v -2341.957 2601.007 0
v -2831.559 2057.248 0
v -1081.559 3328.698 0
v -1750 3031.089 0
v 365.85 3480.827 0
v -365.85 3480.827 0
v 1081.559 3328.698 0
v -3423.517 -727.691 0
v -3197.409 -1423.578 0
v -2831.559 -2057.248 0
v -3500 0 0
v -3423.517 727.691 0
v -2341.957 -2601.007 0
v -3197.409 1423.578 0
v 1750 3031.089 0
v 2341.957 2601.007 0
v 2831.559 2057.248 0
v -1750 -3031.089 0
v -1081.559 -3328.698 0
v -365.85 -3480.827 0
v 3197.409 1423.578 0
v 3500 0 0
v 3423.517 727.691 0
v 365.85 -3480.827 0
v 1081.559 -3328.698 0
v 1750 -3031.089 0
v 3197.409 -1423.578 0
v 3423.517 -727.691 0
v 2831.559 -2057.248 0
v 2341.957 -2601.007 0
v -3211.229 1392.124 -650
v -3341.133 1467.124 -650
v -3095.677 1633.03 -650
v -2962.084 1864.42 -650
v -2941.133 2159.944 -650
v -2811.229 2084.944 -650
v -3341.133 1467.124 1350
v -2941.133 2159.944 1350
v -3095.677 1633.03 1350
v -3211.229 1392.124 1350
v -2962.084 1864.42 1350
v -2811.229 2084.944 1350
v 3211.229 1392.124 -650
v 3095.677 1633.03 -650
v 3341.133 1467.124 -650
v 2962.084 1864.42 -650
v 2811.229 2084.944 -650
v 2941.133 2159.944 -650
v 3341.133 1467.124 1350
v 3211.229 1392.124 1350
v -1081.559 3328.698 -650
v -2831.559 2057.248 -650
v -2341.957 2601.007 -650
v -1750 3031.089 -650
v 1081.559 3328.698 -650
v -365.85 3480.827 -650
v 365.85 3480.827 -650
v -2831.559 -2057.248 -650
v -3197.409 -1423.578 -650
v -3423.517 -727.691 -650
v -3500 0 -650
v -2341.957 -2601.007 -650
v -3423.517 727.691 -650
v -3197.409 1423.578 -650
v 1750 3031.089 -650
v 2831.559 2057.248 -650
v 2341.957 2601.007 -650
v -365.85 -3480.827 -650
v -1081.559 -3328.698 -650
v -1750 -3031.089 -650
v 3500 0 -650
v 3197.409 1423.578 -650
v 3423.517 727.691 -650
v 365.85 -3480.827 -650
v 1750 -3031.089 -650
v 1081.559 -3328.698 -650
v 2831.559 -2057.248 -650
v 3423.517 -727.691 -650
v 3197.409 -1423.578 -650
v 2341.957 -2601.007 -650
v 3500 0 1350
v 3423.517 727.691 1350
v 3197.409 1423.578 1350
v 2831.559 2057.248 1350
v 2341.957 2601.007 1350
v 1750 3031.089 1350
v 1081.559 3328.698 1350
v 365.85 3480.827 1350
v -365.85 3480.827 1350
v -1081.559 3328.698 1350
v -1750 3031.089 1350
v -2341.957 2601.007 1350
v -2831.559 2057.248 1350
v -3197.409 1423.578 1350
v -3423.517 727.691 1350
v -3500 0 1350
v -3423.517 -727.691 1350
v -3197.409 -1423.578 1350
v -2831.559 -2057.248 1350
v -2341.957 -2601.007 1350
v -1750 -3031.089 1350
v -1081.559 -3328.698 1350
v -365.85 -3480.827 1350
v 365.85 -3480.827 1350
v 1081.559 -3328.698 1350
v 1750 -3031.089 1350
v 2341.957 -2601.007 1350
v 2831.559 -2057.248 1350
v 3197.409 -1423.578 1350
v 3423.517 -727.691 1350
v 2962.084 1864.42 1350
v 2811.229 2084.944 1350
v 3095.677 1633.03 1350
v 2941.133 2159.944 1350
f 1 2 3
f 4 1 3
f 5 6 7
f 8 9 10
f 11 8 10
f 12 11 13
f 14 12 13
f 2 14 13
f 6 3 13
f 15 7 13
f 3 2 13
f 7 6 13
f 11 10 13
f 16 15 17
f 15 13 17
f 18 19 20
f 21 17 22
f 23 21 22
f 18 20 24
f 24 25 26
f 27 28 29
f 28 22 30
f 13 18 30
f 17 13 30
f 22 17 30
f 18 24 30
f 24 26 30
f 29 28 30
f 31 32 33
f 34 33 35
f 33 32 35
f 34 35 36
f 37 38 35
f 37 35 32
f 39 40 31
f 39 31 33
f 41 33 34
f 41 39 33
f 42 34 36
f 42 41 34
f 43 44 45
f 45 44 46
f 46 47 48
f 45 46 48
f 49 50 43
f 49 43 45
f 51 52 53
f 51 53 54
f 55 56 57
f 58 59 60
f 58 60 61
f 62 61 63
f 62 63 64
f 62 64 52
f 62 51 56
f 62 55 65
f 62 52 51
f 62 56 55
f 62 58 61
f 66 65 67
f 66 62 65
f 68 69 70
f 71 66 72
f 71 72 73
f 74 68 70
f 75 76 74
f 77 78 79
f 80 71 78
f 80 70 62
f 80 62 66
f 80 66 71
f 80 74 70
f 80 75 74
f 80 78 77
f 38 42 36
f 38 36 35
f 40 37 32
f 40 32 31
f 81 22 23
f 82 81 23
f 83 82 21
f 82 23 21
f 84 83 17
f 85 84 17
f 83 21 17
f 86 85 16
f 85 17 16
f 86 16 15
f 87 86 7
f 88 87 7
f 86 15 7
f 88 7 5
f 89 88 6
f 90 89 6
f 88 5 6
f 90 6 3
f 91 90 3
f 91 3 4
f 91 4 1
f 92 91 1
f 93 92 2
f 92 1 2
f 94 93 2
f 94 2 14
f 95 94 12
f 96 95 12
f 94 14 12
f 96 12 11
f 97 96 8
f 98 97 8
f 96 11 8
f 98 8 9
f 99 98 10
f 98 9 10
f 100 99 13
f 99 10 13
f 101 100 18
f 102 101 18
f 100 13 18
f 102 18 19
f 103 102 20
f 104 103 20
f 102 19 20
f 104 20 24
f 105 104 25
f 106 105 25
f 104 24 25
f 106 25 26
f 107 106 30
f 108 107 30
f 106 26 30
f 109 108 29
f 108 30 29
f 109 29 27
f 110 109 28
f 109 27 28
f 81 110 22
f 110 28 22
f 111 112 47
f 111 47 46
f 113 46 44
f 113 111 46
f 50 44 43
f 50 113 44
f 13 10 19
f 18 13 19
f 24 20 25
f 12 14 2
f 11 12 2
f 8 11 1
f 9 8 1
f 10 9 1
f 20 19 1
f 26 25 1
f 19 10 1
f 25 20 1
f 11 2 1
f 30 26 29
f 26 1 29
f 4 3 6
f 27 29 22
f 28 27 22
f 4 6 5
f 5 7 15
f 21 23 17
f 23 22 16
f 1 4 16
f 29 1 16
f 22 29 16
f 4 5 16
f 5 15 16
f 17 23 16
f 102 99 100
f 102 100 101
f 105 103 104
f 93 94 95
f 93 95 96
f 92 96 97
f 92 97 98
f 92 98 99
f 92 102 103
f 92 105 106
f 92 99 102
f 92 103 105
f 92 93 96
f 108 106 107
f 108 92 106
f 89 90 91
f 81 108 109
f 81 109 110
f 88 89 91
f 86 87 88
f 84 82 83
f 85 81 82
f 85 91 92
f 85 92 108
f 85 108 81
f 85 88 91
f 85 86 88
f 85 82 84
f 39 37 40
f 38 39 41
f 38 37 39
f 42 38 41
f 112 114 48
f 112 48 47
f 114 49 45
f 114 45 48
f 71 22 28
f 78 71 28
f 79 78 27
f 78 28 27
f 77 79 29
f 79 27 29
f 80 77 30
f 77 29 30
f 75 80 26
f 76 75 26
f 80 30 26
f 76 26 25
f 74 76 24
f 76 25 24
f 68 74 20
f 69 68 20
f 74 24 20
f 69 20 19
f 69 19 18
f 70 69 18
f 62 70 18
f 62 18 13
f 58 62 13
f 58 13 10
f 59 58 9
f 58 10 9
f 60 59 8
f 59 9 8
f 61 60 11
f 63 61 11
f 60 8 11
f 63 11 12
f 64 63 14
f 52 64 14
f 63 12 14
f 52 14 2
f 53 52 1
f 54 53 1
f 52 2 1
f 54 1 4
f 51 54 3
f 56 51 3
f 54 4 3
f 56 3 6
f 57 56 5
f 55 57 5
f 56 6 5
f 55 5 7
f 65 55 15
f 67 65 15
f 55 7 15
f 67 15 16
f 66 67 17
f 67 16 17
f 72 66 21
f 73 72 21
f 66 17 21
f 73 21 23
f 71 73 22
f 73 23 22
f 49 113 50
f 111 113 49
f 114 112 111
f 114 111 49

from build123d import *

# Parameters (mm, degrees)
F0_R      = 3500
F1_DEPTH  = 1350
F7_DEPTH  = 2000
F9_R      = 3500
F10_DEPTH = 650


# Not quite as in the source:
# - the program builds the solid bodies; features that only make, move or delete a surface that nothing else refers to are left out


with BuildPart() as f1:
    # F0 (on Top) → F1 (new body)
    with BuildSketch(Plane.XY):
        Circle(F0_R)
    extrude(amount=F1_DEPTH)


with BuildPart() as f7:
    # F6 (on face) → F7 (new body)
    with BuildSketch(Plane.XY.offset(1350)):
        with BuildLine():
            Line((-3341.1327955504, 1467.1237035576), (-3211.2289849827, 1392.1237035576))
            ThreePointArc((-3211.2289849827, 1392.1237035576), (-3126.2840636327, 1573.6416216776), (-3031.0889132455, 1750))
            Line((-3031.0889132455, 1750), (-3141.1327955504, 1813.5338650714))
            Line((-3141.1327955504, 1813.5338650714), (-3341.1327955504, 1467.1237035576))
        make_face()
        with BuildLine():
            Line((-3141.1327955504, 1813.5338650714), (-3031.0889132455, 1750))
            ThreePointArc((-3031.0889132455, 1750), (-2925.9556526417, 1920.6206077136), (-2811.2289849827, 2084.9440265851))
            Line((-2811.2289849827, 2084.9440265851), (-2941.1327955504, 2159.9440265851))
            Line((-2941.1327955504, 2159.9440265851), (-3141.1327955504, 1813.5338650714))
        make_face()
    extrude(amount=-F7_DEPTH)


with BuildPart() as f7b:
    # F6 (on face) → F7, piece 2 (new body)
    with BuildSketch(Plane.XY.offset(1350)):
        with BuildLine():
            ThreePointArc((2811.2289849827, 2084.9440265851), (2925.9556526417, 1920.6206077136), (3031.0889132455, 1750))
            Line((3031.0889132455, 1750), (3141.1327955504, 1813.5338650714))
            Line((3141.1327955504, 1813.5338650714), (2941.1327955504, 2159.9440265851))
            Line((2941.1327955504, 2159.9440265851), (2811.2289849827, 2084.9440265851))
        make_face()
        with BuildLine():
            ThreePointArc((3031.0889132455, 1750), (3126.2840636327, 1573.6416216776), (3211.2289849827, 1392.1237035576))
            Line((3211.2289849827, 1392.1237035576), (3341.1327955504, 1467.1237035576))
            Line((3341.1327955504, 1467.1237035576), (3141.1327955504, 1813.5338650714))
            Line((3141.1327955504, 1813.5338650714), (3031.0889132455, 1750))
        make_face()
    extrude(amount=-F7_DEPTH)


with BuildPart() as f10:
    # F9 (on offset) → F10 (new body)
    with BuildSketch(Plane(origin=(0, 0, 0), x_dir=(1, 0, 0), z_dir=(0, 0, -1))):
        Circle(F9_R)
    extrude(amount=F10_DEPTH)


solid = Compound([f1.part, f7.part, f7b.part, f10.part])
